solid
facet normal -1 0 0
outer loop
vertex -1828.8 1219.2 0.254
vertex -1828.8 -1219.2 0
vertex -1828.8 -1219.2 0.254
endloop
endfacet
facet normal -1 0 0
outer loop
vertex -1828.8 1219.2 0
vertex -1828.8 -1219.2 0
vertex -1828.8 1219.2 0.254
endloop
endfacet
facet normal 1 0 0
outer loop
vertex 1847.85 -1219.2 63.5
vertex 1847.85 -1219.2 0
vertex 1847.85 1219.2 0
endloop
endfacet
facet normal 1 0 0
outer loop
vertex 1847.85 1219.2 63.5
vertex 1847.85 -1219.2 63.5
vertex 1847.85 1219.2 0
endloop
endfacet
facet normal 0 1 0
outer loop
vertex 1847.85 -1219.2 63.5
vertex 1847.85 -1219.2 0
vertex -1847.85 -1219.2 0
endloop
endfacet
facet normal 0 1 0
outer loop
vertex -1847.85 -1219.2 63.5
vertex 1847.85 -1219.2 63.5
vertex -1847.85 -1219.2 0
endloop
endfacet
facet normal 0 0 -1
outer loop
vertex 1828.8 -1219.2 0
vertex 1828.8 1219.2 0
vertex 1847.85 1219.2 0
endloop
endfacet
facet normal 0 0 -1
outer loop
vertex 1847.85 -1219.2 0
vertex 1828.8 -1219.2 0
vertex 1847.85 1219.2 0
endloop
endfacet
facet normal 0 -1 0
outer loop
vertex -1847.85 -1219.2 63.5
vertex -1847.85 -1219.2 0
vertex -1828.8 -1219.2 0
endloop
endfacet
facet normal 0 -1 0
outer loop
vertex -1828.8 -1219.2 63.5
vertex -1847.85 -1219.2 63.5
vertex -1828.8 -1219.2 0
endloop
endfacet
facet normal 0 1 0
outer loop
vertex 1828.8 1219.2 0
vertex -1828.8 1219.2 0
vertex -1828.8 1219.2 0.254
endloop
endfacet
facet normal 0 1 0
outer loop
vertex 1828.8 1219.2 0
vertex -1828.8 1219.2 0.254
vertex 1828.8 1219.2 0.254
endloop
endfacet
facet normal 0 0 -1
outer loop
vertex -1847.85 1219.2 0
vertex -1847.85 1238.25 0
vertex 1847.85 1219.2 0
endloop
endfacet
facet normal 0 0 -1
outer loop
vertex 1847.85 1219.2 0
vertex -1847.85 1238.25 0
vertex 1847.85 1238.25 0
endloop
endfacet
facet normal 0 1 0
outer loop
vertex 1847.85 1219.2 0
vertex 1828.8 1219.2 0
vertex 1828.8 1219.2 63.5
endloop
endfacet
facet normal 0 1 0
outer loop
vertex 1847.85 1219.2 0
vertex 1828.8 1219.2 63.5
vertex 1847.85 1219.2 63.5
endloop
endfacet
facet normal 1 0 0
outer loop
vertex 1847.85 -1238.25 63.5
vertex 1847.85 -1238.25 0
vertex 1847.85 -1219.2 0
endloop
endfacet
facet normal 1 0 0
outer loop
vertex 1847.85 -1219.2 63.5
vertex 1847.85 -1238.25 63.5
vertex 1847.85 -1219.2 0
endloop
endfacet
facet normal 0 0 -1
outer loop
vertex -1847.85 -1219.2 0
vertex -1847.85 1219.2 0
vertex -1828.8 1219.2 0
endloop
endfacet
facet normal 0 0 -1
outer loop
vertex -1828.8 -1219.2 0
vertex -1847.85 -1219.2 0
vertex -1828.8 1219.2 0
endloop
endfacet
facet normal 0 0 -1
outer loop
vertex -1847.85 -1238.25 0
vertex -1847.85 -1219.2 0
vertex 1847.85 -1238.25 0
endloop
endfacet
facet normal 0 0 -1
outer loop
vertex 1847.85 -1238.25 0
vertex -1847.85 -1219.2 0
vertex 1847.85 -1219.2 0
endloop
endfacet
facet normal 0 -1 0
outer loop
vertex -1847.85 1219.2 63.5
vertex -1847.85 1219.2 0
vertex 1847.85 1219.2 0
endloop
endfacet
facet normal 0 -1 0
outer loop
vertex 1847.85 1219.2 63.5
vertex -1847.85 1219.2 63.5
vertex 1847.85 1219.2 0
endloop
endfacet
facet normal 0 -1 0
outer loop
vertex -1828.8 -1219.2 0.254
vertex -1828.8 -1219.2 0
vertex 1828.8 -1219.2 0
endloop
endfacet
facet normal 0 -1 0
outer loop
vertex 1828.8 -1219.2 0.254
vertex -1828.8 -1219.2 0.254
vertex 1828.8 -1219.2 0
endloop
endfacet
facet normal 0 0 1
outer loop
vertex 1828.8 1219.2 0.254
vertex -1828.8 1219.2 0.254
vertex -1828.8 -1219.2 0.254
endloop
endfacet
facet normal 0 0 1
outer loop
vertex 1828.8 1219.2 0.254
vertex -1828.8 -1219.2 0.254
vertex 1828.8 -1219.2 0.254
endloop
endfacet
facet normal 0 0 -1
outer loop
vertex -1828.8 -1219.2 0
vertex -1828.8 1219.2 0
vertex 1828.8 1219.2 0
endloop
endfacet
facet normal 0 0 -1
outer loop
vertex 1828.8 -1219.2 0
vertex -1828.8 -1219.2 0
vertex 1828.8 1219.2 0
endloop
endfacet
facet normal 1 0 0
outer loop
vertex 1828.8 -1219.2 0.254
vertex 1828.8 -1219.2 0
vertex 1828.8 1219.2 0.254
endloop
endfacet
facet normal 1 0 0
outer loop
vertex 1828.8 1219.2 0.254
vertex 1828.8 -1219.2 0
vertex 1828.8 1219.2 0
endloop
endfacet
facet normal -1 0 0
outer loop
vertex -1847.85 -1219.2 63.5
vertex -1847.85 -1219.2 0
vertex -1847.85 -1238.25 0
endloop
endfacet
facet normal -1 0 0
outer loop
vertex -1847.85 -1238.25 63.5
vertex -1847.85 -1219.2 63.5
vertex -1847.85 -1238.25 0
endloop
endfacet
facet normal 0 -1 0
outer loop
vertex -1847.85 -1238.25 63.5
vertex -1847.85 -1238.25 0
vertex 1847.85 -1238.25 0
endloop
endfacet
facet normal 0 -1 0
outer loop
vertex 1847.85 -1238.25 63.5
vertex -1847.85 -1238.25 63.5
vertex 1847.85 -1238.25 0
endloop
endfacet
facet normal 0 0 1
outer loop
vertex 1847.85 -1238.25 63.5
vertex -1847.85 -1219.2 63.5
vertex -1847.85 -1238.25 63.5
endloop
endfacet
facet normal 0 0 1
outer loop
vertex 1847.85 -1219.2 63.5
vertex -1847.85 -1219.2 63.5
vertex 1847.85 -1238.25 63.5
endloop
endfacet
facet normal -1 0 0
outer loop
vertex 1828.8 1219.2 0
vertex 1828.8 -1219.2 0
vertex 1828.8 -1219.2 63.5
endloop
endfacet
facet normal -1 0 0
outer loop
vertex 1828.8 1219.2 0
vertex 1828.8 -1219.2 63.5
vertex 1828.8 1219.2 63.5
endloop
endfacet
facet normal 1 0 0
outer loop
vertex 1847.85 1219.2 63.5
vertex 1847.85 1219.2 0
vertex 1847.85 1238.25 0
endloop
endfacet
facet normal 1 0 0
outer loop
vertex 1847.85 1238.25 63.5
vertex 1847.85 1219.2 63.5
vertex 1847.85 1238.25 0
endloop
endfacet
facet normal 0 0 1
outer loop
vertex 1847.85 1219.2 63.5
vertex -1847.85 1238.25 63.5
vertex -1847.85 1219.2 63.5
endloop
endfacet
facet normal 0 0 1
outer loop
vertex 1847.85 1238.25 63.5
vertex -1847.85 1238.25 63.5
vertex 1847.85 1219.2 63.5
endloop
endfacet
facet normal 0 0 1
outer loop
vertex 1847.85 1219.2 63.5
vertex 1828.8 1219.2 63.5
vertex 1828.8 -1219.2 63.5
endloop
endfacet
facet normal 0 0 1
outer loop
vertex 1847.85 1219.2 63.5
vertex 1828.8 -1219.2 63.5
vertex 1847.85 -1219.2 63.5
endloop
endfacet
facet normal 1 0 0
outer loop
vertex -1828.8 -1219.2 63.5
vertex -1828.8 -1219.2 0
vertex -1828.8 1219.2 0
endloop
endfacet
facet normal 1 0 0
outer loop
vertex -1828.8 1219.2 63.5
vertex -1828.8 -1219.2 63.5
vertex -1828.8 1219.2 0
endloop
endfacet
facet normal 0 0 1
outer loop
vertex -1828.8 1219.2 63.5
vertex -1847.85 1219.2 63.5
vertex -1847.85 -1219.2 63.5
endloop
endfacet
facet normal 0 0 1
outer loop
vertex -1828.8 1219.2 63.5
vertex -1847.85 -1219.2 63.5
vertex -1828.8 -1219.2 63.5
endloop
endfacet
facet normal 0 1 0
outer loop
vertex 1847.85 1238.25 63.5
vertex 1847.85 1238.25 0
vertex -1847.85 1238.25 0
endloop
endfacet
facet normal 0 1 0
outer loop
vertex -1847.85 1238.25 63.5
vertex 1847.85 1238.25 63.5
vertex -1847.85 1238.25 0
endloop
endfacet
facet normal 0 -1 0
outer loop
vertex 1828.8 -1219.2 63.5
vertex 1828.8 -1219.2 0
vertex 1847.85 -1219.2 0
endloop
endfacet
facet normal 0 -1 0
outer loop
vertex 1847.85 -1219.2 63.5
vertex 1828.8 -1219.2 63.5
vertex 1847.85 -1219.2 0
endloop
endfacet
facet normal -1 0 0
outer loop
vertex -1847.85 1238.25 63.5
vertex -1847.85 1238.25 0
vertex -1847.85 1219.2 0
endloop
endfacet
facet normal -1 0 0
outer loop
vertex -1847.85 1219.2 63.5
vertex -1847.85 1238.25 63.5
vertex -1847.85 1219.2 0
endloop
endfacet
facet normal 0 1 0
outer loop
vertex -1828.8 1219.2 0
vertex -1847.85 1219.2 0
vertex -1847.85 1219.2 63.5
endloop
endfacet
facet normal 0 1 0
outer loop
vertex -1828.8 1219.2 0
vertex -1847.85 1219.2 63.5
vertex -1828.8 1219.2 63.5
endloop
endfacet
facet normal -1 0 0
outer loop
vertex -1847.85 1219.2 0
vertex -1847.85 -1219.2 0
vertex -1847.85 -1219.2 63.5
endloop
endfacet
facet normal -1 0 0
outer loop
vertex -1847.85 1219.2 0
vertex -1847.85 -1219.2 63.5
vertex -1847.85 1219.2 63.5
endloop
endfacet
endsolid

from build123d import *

# Parameters (mm, degrees)
F1_W     = 19.05
F1_H     = 2438.4
F2_DEPTH = 63.5
F3_W     = 19.05
F3_H     = 2438.4
F4_DEPTH = 63.5
F6_DEPTH = 63.5
F8_DEPTH = 63.5
F0_W     = 3657.6
F0_H     = 2438.4
F9_DEPTH = 0.254


with BuildPart() as f2:
    # F1 (on face) → F2 (new body)
    with BuildSketch(Plane.XY):
        with Locations((-1838.325, 0)):
            Rectangle(F1_W, F1_H)
    extrude(amount=F2_DEPTH)


with BuildPart() as f4:
    # F3 (on face) → F4 (new body)
    with BuildSketch(Plane.XY):
        with Locations((1838.325, 0)):
            Rectangle(F3_W, F3_H)
    extrude(amount=F4_DEPTH)


with BuildPart() as f6:
    # F5 (on face) → F6 (new body)
    with BuildSketch(Plane.XY):
        Polygon((-1847.85, 1238.25), (-1847.85, 1219.2), (-1828.8, 1219.2), (1828.8, 1219.2), (1847.85, 1219.2), (1847.85, 1238.25), align=None)
    extrude(amount=F6_DEPTH)


with BuildPart() as f8:
    # F7 (on face) → F8 (new body)
    with BuildSketch(Plane.XY):
        Polygon((-1828.8, -1219.2), (-1847.85, -1219.2), (-1847.85, -1238.25), (1847.85, -1238.25), (1847.85, -1219.2), (1828.8, -1219.2), align=None)
    extrude(amount=F8_DEPTH)


with BuildPart() as f9:
    # F0 (on Top) → F9 (new body)
    with BuildSketch(Plane.XY):
        Rectangle(F0_W, F0_H)
    extrude(amount=F9_DEPTH)


solid = Compound([f2.part, f4.part, f6.part, f8.part, f9.part])
